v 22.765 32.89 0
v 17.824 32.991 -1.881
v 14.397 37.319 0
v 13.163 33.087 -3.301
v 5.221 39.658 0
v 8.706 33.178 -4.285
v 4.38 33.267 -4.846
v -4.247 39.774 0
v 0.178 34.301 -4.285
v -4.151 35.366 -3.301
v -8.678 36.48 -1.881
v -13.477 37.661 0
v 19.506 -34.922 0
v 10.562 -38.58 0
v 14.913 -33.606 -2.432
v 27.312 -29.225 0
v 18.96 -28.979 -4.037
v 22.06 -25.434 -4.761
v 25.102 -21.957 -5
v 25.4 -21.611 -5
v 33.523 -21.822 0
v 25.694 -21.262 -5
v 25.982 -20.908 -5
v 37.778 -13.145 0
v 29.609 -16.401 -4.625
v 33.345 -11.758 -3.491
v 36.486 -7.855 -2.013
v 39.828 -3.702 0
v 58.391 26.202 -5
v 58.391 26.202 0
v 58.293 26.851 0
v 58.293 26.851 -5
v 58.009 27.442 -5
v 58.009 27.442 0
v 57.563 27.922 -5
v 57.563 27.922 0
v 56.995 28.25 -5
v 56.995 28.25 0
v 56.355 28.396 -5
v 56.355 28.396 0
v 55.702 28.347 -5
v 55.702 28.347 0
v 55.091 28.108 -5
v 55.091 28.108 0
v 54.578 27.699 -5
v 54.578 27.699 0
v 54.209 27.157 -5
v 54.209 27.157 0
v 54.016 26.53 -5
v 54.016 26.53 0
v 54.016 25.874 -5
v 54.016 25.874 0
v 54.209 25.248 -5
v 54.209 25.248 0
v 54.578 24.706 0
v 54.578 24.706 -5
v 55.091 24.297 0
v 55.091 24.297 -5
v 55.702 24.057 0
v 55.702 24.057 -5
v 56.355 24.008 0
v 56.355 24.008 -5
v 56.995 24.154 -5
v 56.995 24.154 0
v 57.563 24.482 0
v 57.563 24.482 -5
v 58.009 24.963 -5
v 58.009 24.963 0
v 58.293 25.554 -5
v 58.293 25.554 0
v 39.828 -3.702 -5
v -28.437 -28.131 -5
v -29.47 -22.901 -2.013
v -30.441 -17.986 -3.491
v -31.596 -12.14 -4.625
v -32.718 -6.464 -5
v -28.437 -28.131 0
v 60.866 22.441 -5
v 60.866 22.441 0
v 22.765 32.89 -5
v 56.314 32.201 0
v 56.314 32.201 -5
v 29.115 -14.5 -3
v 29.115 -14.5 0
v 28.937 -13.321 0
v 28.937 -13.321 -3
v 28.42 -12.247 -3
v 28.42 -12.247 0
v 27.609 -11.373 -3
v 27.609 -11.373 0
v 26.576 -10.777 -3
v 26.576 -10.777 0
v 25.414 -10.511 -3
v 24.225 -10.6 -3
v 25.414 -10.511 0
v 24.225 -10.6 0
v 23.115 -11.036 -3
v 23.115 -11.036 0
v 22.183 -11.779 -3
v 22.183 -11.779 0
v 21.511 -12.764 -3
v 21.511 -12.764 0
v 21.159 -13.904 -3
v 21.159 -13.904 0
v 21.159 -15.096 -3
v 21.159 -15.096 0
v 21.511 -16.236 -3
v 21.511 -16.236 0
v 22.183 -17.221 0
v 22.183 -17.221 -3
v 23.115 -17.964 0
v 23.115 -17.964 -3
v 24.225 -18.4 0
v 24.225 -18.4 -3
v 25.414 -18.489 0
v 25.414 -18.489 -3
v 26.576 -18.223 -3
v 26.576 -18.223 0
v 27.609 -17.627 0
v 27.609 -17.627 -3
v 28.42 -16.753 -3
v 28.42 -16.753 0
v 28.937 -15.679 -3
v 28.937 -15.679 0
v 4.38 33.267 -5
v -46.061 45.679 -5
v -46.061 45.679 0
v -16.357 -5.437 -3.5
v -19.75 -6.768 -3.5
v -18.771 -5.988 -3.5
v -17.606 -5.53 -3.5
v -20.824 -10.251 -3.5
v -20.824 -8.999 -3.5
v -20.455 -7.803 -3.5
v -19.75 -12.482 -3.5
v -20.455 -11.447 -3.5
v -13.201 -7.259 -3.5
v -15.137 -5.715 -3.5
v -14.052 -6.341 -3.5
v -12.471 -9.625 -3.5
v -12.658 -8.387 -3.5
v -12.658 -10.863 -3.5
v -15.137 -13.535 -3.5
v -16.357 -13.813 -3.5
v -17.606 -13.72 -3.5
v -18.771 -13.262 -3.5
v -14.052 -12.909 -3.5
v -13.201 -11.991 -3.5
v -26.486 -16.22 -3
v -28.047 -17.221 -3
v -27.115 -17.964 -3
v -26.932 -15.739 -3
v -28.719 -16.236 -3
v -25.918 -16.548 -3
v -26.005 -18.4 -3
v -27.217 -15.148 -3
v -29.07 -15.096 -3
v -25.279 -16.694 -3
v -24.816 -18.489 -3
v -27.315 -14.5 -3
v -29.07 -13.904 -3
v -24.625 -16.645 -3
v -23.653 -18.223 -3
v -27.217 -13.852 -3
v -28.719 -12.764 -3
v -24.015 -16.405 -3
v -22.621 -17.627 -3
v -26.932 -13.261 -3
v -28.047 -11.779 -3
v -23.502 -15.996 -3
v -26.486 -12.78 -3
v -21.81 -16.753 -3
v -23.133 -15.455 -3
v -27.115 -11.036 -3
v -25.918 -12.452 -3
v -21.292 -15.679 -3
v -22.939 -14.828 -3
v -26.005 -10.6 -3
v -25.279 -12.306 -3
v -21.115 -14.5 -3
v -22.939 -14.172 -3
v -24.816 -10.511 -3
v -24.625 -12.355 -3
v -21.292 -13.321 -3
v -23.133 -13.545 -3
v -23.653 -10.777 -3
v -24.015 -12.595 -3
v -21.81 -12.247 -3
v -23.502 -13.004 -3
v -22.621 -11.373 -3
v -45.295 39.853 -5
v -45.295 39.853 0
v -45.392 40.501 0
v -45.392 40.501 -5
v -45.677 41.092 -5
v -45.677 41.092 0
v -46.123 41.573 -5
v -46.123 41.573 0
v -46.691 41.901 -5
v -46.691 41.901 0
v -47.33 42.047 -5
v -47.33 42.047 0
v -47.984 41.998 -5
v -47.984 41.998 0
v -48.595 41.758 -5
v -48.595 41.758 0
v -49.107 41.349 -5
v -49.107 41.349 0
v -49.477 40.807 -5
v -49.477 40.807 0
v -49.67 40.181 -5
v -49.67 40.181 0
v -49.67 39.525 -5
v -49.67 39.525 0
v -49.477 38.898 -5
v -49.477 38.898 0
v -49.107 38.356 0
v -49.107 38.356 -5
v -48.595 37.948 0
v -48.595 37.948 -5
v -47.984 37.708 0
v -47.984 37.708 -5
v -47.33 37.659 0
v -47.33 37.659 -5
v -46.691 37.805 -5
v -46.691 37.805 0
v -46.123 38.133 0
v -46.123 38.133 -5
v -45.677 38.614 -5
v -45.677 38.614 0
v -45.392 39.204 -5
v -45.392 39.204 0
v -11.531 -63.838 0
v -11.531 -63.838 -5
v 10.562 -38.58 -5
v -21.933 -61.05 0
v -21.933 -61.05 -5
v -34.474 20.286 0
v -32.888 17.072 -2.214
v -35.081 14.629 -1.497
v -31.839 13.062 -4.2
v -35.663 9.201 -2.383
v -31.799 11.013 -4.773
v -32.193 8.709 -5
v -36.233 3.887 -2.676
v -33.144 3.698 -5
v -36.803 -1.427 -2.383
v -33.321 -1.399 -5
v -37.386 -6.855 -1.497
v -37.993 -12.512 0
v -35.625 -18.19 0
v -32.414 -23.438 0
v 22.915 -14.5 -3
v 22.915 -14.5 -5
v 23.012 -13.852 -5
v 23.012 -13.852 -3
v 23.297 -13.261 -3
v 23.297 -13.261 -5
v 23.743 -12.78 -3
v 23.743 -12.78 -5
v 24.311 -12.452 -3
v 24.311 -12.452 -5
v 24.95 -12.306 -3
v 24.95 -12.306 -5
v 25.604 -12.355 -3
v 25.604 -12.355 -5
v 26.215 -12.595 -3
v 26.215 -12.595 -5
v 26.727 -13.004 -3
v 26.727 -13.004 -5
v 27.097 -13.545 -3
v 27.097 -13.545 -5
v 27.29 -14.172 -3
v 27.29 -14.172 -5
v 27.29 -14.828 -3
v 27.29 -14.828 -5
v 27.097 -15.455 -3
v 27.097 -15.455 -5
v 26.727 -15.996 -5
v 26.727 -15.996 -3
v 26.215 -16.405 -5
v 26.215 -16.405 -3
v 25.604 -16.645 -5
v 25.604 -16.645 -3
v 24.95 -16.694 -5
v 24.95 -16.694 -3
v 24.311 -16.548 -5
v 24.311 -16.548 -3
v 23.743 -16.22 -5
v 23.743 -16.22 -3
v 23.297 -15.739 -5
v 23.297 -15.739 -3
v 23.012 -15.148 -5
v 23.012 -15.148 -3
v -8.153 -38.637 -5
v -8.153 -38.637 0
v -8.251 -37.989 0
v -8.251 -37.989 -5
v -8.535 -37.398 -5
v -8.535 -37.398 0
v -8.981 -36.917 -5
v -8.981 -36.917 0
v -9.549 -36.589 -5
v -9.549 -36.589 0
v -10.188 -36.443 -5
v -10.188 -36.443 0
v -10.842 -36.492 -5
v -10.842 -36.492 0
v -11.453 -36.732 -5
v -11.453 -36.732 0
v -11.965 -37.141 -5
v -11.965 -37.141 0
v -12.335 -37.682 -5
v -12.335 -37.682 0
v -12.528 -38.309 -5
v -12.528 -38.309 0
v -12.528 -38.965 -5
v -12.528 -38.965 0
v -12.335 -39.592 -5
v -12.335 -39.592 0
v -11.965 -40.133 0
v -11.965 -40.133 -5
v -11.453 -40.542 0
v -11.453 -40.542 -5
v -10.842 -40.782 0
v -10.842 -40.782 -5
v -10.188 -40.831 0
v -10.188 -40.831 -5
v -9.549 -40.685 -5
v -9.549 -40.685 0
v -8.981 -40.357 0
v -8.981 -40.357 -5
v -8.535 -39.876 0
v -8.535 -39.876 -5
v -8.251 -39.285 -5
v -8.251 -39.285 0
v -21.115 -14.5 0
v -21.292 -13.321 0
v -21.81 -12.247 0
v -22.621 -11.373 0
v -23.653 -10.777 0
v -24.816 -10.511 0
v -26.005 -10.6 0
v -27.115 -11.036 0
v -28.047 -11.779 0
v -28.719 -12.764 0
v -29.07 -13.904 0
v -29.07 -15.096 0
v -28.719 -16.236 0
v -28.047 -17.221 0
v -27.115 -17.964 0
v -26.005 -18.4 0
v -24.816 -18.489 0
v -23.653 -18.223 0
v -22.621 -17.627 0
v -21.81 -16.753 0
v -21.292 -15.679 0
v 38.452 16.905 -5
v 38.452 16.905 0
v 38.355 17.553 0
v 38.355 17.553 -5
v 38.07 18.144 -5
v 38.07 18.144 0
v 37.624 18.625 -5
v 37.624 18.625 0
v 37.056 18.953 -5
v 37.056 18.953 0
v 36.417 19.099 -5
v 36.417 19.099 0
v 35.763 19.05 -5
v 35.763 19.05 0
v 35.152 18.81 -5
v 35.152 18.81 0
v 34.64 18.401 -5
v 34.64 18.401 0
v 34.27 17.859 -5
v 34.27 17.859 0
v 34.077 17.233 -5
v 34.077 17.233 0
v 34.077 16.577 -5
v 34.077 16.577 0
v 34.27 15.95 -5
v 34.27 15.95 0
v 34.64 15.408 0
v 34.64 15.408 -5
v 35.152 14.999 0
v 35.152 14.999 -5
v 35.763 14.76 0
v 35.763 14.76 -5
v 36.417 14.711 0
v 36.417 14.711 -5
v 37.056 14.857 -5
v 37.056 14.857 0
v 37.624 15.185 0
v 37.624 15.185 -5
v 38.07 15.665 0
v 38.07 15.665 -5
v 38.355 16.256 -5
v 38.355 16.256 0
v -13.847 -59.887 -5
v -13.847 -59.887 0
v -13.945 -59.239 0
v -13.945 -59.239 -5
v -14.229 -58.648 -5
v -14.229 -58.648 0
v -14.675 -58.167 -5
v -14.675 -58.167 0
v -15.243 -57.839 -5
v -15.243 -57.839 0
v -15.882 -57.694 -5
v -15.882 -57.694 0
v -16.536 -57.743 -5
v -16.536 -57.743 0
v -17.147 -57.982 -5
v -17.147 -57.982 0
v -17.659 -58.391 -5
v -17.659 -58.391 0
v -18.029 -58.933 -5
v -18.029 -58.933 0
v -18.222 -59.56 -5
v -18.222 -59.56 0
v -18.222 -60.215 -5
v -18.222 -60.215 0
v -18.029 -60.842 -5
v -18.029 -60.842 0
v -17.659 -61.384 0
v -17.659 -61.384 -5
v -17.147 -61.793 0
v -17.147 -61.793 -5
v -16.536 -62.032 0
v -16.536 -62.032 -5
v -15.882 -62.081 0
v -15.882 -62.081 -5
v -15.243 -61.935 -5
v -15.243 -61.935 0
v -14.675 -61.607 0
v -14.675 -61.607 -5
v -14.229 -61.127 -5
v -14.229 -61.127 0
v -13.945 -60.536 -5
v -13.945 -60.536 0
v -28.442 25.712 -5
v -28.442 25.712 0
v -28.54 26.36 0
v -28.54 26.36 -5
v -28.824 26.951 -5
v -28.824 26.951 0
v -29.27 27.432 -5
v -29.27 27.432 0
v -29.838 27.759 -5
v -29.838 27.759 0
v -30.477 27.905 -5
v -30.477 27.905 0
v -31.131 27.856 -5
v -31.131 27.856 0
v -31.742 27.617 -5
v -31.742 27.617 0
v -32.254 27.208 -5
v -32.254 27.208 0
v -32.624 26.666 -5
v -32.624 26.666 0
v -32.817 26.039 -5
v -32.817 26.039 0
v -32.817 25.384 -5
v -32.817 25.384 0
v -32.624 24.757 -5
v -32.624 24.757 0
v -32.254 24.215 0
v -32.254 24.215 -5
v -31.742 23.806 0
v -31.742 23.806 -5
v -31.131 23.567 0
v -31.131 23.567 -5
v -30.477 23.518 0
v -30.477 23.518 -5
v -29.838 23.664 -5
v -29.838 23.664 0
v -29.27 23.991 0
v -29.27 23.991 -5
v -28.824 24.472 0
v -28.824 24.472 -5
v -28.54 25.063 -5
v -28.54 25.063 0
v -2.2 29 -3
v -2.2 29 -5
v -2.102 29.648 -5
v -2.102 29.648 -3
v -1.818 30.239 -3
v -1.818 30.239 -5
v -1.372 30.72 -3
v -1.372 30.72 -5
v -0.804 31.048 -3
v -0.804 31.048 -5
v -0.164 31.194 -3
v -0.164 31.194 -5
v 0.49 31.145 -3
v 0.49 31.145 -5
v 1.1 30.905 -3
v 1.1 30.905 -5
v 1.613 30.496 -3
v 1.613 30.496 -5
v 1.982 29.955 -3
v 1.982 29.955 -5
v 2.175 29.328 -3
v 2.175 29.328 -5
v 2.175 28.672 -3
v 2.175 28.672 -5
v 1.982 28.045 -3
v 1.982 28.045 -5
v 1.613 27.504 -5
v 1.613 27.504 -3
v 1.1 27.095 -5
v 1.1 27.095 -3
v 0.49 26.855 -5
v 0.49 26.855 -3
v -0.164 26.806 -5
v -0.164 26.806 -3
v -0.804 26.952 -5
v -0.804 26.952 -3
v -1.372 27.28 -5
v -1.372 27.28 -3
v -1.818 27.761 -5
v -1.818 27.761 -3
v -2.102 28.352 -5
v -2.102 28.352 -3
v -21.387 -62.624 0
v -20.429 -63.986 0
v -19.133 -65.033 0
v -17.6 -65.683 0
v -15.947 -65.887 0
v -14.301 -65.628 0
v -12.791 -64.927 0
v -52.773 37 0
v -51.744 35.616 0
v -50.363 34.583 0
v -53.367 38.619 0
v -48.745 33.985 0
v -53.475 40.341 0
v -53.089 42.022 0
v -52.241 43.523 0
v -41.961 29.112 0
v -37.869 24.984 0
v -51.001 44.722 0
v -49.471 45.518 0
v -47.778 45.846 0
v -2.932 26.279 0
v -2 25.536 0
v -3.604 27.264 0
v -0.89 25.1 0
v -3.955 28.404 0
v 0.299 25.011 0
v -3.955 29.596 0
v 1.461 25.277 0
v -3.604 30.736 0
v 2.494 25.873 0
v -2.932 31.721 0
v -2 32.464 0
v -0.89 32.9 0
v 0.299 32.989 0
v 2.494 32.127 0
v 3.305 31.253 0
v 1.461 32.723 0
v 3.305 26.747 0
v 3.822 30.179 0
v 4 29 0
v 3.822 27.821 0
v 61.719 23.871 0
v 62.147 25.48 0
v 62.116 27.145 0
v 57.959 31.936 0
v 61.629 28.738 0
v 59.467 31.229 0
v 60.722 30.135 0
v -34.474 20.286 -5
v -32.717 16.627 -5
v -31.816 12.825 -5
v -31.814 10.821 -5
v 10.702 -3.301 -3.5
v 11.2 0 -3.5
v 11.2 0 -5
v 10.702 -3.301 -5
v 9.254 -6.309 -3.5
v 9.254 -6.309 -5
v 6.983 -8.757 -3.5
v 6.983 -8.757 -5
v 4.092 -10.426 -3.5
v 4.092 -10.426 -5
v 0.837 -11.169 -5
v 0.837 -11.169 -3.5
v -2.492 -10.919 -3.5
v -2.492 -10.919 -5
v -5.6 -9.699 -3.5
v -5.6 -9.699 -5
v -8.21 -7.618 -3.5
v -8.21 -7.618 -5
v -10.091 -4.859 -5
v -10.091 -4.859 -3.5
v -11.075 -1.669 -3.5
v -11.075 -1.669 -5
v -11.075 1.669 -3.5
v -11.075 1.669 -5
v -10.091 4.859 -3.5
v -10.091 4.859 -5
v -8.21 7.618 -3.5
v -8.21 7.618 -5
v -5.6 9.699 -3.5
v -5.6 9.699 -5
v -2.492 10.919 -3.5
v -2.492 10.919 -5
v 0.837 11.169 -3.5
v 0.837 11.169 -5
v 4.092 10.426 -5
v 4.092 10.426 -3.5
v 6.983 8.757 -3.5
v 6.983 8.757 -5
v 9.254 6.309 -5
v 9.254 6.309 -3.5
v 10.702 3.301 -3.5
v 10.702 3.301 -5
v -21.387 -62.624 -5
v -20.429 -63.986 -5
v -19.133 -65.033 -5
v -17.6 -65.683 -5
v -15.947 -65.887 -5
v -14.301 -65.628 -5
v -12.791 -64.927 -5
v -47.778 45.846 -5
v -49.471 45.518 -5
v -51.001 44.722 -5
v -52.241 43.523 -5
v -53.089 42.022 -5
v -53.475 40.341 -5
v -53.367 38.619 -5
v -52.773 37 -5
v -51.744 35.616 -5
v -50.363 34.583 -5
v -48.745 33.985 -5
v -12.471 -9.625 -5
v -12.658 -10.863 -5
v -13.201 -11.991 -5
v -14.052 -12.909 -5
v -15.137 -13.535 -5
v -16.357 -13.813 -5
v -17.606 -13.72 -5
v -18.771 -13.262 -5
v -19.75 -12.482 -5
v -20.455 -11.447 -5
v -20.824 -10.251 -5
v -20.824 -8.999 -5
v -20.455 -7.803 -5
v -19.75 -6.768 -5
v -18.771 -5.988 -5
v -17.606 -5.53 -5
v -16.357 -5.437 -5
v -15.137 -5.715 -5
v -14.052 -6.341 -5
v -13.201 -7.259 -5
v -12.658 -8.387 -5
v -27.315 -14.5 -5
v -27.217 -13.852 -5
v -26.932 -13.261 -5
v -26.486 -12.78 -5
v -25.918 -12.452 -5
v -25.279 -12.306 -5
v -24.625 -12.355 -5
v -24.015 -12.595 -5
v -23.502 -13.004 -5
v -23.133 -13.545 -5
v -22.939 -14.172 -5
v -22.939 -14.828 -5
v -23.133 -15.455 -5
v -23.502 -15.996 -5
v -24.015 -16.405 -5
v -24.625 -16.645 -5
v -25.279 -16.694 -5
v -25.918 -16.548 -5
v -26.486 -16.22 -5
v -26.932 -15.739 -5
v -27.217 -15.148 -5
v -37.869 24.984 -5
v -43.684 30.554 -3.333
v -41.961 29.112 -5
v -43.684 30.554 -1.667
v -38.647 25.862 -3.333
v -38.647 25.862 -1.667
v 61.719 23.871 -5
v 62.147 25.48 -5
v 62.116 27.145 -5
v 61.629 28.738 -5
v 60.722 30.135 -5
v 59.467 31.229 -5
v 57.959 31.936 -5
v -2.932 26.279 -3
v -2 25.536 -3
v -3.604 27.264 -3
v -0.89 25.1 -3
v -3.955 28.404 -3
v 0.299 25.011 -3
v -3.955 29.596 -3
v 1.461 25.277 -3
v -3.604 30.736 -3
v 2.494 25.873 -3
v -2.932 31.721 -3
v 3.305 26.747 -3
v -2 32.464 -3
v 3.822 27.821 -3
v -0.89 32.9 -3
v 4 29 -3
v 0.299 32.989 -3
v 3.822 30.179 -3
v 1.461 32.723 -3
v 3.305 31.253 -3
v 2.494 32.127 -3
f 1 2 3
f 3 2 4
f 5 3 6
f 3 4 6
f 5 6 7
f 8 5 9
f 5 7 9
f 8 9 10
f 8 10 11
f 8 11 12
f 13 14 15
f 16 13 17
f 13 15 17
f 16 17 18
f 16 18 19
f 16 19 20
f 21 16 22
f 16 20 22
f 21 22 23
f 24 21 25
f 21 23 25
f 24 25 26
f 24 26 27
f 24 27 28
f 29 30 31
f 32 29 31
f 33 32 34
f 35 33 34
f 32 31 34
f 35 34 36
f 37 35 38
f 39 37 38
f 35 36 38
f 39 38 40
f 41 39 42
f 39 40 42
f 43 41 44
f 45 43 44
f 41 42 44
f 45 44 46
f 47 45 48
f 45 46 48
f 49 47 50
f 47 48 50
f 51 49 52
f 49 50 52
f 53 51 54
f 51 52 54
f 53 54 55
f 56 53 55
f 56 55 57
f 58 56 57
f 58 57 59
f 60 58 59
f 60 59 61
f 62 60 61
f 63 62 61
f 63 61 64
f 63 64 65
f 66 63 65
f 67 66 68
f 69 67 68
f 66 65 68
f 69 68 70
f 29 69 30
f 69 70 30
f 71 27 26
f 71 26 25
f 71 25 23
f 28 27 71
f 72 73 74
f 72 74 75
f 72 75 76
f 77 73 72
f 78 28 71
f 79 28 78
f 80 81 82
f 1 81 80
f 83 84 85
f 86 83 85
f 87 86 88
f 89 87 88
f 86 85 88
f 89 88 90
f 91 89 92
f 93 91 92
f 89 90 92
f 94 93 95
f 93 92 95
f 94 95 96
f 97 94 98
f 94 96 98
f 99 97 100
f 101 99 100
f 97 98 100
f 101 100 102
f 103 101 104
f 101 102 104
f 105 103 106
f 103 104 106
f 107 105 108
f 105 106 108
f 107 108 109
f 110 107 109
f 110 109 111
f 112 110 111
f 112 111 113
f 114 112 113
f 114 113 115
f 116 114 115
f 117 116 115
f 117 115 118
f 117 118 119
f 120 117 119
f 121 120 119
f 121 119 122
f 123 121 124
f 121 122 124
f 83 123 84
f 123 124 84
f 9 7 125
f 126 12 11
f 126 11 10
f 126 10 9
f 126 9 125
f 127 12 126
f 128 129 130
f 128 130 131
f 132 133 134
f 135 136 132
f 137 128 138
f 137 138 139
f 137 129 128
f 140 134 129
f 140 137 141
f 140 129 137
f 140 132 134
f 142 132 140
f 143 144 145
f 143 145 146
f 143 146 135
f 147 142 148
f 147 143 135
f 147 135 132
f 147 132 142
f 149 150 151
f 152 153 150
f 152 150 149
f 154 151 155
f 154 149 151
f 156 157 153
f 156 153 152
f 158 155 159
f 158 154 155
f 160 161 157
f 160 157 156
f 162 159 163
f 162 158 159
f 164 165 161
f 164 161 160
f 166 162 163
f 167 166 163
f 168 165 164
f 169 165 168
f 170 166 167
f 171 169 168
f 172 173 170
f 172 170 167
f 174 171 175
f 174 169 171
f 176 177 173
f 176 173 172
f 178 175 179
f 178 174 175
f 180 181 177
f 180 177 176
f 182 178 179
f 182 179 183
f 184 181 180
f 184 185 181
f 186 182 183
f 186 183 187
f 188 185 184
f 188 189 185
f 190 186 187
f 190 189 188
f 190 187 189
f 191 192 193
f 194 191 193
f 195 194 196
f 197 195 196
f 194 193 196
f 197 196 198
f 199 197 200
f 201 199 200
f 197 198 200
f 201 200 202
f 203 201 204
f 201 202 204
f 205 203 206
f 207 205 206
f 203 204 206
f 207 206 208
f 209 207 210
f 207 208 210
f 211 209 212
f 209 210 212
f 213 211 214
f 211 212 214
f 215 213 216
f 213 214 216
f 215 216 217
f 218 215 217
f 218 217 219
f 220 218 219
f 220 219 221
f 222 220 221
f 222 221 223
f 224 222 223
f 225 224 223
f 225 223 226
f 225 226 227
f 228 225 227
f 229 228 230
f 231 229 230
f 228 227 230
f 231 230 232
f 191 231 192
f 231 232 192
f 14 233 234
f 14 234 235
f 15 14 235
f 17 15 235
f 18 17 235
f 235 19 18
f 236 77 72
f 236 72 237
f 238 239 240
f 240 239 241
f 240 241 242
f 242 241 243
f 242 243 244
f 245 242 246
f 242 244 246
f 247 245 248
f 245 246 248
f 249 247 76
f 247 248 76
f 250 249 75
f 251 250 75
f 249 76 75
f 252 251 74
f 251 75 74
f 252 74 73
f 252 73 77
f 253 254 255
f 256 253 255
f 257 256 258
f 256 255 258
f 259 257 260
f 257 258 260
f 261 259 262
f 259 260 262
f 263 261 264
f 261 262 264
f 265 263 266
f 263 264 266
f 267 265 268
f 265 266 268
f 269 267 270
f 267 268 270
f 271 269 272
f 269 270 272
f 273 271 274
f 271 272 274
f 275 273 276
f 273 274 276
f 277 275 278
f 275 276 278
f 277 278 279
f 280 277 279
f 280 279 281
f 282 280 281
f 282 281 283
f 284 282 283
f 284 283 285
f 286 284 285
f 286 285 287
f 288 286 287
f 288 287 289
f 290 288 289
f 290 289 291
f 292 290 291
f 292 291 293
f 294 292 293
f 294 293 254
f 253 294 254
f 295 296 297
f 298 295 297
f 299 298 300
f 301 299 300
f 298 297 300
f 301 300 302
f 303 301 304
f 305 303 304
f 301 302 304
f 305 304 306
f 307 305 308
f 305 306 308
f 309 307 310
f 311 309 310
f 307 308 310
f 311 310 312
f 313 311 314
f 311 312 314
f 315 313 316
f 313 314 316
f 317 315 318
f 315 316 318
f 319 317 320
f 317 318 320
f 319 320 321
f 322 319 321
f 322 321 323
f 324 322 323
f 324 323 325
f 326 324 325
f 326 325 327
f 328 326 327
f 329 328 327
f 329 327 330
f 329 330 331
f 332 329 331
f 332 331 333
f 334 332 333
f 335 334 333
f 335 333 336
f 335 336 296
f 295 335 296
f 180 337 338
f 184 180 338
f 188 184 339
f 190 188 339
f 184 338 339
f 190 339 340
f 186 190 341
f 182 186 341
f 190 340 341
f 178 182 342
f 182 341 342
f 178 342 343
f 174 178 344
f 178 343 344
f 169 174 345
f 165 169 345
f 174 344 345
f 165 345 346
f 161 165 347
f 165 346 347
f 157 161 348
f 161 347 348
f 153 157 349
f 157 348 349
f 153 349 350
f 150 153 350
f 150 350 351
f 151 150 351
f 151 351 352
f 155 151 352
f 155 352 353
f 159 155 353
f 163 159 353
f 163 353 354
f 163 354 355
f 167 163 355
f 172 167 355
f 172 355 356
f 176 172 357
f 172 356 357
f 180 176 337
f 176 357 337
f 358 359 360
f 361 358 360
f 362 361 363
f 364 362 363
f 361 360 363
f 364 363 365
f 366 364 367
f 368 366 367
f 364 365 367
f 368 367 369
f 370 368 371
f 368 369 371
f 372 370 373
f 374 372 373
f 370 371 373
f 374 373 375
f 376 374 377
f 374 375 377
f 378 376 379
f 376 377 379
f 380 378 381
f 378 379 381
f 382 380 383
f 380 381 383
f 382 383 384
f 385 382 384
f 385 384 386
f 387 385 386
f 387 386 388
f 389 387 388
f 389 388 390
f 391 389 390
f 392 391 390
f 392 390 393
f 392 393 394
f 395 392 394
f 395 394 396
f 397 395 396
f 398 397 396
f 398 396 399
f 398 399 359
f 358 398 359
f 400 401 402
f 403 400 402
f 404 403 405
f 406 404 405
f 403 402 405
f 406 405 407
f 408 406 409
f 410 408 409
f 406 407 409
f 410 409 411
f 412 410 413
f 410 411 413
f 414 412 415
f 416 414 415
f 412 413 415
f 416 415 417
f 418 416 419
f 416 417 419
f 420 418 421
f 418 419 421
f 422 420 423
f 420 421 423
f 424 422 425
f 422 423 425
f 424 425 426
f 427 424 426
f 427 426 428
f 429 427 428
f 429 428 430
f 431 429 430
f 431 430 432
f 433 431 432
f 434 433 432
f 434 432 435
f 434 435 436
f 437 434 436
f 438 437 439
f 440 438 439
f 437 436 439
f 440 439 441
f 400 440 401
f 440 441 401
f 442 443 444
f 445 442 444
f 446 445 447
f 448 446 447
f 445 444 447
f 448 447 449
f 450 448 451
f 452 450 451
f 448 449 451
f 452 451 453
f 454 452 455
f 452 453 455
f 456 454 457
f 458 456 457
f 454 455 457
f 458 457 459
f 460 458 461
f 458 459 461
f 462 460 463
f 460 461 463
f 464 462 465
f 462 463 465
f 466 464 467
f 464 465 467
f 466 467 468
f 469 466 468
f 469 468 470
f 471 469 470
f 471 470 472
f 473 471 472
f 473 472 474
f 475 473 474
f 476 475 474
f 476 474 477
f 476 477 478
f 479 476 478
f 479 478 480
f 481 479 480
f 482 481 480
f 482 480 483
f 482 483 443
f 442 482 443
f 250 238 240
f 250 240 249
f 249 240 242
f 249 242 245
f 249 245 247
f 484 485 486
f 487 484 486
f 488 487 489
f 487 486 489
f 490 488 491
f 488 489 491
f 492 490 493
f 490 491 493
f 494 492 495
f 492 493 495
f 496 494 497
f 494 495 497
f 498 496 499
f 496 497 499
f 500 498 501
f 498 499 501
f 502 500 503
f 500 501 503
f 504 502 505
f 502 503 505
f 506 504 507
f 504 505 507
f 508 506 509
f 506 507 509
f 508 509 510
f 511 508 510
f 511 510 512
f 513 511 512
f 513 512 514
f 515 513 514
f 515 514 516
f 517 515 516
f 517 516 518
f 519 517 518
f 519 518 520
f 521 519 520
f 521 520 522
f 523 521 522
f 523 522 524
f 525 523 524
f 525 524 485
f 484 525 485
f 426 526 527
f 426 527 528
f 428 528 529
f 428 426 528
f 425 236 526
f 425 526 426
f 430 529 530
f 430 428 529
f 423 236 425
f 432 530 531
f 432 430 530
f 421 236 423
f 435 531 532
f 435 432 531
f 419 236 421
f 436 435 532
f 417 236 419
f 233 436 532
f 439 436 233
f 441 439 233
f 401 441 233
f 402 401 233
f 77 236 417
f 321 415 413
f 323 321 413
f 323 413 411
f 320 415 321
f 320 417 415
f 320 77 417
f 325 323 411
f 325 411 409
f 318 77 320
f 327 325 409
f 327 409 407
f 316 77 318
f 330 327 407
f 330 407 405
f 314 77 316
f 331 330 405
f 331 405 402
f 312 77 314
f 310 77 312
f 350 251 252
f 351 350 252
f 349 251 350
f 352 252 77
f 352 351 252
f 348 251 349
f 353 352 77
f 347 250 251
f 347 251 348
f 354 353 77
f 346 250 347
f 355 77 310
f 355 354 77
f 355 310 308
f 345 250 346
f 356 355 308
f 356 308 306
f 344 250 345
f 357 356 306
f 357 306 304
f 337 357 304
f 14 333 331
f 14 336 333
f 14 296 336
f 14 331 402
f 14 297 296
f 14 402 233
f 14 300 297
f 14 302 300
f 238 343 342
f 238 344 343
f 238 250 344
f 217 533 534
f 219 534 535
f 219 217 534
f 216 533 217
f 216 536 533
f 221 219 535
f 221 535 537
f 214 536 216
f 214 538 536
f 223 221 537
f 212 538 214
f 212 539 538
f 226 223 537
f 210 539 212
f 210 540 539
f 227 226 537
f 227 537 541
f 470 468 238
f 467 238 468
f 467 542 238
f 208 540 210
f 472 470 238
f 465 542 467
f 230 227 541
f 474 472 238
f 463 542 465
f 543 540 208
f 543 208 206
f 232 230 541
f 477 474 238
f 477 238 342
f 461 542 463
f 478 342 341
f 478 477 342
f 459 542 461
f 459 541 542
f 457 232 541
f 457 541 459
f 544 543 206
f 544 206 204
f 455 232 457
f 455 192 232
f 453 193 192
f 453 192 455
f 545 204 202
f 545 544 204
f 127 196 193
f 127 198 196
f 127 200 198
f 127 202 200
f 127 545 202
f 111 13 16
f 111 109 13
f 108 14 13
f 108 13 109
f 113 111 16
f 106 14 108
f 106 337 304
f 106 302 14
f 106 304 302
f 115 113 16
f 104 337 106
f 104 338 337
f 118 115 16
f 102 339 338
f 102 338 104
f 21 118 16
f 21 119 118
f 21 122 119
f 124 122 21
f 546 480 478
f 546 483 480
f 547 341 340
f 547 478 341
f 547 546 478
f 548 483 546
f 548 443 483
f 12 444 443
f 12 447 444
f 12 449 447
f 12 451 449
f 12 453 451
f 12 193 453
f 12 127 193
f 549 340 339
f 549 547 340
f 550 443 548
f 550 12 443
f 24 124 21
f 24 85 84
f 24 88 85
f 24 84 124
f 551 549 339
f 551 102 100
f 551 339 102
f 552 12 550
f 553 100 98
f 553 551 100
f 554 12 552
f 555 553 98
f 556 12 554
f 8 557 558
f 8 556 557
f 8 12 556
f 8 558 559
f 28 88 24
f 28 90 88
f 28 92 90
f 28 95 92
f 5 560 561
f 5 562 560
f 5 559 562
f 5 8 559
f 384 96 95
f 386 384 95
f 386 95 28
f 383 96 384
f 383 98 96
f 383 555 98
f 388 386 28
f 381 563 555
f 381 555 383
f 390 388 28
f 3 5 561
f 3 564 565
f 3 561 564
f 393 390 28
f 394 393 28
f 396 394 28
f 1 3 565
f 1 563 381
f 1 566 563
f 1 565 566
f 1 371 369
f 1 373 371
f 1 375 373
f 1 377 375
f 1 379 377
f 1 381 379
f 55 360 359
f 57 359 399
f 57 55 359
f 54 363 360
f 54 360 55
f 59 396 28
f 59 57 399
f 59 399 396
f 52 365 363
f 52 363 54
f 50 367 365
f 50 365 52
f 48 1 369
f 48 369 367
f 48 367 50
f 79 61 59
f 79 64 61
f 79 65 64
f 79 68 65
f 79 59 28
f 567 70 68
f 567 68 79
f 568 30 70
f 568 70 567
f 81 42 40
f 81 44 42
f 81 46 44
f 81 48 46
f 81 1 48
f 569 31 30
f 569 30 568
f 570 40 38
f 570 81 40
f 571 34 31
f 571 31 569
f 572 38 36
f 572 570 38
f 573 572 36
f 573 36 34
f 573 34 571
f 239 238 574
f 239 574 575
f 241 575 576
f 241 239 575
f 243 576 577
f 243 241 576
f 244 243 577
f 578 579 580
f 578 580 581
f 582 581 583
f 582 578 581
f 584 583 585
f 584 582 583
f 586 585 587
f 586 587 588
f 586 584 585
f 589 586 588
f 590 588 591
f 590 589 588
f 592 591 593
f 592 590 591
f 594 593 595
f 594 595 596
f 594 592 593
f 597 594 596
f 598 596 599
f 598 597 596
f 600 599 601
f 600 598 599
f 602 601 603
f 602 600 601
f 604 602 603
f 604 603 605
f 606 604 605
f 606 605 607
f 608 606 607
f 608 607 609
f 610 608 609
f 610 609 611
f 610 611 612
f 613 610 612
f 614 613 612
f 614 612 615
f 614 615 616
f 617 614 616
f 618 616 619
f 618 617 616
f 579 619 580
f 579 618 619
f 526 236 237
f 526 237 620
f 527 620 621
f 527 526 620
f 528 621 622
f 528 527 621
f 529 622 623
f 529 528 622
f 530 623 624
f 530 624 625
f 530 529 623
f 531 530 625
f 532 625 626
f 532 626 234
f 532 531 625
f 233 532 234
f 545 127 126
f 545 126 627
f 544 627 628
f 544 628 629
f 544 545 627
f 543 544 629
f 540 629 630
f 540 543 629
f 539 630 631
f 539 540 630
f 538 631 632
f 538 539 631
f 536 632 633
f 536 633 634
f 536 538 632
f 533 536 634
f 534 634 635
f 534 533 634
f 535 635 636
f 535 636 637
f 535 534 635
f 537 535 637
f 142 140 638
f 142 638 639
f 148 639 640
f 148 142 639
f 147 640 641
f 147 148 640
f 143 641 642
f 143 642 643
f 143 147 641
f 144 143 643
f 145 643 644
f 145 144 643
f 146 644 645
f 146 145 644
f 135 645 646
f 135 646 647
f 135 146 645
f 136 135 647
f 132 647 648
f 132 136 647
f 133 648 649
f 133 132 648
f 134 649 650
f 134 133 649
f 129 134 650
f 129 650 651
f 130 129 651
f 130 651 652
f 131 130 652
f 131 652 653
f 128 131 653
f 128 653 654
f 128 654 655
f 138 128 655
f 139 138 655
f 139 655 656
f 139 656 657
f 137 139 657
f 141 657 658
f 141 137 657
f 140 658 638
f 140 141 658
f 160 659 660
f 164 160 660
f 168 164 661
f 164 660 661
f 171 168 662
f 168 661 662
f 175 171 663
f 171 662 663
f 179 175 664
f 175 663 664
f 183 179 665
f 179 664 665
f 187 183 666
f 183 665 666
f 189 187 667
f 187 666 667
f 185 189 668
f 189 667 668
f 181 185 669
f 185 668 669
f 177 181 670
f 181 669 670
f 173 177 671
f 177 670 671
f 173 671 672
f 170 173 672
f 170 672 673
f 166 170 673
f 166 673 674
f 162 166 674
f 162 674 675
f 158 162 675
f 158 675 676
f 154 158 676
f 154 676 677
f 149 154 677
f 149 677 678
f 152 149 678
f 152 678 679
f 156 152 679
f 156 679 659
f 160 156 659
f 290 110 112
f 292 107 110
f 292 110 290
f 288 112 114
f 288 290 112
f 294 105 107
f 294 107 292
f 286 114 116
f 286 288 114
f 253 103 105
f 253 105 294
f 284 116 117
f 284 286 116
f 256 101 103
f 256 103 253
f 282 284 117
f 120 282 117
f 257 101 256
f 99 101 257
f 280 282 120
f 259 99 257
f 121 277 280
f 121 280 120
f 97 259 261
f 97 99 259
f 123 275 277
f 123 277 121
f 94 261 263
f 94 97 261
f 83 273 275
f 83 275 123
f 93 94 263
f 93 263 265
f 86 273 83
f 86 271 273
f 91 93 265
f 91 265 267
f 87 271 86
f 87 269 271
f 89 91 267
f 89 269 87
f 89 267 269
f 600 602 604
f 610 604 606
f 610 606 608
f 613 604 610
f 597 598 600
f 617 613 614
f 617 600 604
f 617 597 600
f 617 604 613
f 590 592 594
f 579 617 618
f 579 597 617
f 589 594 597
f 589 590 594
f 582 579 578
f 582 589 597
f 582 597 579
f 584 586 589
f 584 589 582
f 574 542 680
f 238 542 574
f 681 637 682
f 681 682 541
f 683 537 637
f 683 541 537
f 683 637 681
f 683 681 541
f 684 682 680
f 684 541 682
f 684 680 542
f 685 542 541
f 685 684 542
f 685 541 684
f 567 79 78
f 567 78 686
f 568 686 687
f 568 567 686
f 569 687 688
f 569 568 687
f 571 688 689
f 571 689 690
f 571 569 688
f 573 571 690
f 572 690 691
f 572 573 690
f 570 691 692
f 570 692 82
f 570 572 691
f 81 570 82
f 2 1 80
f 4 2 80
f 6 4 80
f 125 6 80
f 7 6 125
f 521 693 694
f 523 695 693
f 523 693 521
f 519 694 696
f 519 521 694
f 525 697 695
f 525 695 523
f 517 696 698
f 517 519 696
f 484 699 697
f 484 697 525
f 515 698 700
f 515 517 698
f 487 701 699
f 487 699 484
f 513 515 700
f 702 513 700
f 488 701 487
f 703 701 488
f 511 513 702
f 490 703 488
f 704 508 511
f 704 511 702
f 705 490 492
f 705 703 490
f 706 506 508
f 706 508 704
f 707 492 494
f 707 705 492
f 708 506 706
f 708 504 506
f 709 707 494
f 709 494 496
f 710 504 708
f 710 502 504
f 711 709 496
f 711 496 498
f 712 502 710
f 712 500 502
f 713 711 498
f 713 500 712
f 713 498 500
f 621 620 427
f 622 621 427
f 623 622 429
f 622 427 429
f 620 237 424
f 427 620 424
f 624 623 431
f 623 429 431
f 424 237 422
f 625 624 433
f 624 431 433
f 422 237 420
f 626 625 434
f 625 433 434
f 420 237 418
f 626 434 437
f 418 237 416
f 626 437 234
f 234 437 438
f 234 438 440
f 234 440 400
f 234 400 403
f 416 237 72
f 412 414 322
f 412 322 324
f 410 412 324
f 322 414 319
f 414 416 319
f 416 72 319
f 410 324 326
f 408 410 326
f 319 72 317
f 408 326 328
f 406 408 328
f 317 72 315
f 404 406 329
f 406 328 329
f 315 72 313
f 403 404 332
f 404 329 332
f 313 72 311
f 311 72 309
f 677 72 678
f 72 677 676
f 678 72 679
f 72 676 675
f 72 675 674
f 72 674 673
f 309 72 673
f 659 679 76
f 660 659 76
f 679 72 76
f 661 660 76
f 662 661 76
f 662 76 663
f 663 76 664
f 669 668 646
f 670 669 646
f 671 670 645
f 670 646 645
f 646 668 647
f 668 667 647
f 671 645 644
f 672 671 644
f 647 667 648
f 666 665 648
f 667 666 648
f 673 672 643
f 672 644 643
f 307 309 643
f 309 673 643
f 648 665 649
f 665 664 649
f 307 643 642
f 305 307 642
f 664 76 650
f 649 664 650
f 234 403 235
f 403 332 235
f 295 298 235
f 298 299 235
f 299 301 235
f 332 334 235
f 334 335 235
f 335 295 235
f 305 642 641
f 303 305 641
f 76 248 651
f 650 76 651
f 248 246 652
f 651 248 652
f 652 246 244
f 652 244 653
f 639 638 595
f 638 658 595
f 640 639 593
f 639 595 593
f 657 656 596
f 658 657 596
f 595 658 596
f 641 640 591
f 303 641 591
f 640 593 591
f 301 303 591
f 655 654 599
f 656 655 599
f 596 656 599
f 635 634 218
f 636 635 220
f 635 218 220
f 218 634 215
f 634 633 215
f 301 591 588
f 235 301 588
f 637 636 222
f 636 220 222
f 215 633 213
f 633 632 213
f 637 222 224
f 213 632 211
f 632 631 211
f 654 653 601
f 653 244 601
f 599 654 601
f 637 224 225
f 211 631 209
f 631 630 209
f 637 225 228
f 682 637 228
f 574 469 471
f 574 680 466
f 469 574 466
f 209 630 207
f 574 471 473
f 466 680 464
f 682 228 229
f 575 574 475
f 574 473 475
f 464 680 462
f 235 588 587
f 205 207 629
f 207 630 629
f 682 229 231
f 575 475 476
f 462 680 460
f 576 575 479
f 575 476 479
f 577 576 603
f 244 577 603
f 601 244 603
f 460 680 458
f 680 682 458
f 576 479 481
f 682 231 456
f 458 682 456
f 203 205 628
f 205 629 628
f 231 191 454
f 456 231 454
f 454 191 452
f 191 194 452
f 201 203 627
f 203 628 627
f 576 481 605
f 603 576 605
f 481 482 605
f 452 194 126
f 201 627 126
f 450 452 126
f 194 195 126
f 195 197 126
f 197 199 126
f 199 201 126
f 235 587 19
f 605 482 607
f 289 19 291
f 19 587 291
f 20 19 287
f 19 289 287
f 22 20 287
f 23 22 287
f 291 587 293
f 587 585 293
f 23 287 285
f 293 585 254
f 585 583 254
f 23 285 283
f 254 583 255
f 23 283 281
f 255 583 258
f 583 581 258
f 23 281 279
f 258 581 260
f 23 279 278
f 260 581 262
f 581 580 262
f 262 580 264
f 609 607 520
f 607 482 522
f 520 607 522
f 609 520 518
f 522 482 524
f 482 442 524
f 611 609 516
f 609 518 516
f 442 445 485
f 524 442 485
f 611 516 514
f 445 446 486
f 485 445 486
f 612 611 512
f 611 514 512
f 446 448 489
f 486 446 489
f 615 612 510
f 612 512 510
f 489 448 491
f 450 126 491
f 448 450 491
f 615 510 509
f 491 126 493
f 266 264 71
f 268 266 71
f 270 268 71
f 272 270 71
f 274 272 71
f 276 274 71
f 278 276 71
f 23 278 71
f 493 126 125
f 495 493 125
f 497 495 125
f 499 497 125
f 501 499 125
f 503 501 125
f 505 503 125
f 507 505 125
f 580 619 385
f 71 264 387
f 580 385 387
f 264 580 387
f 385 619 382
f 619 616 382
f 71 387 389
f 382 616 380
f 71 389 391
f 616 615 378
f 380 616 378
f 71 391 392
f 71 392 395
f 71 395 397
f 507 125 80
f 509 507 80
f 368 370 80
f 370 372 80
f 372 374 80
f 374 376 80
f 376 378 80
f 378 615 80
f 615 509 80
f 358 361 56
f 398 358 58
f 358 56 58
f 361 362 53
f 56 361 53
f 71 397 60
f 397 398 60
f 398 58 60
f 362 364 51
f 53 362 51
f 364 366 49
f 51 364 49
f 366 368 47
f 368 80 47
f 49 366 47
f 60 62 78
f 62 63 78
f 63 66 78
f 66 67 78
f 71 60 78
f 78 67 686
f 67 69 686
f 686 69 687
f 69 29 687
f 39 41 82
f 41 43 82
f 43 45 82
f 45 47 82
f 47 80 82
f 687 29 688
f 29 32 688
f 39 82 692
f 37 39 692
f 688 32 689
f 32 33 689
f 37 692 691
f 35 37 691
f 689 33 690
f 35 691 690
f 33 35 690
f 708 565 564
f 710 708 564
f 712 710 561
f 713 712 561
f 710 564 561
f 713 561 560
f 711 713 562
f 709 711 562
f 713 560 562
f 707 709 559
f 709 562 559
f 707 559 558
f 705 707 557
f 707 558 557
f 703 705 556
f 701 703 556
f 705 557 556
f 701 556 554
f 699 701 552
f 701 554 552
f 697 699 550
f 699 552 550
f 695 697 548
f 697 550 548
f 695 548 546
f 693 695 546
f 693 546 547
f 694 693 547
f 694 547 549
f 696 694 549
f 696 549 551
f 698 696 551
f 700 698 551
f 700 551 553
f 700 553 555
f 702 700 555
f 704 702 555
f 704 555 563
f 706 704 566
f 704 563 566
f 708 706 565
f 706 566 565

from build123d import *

# Parameters (mm, degrees)
SKETCH_1_R               = 40
SKETCH_2_R               = 33.35
SKETCH_3_R               = 2.2
CUT_EXTRUDE_1_DEPTH      = 57.789083608
SKETCH_4_R               = 4
CUT_EXTRUDE_2_DEPTH      = 3
OTHER_START              = -5
OTHER_1_OUTLINE_R        = 4
OTHER_1_OUTLINE_R_2      = 2.9
OTHER_1_OUTLINE_R_3      = 11
OTHER_1_OUTLINE_R_4      = 9
OTHER_1_DEPTH            = 1.5
CUT_EXTRUDE_START        = 27
SKETCH_5_R               = 11.2
SKETCH_5_R_2             = 4.2
CUT_EXTRUDE_3_DEPTH      = 1.5
SKETCH_7_R               = 2.2
EXTRUDE_1_DEPTH          = 5
HOLE_WIZARD_4_4_4_4_1_D  = 4.4
CUT_EXTRUDE_4_DEPTH      = 91.740732016
CUT_EXTRUDE_4_DEPTH_BACK = 91.740732016


# Read off the part's stored shape, not the designer's step: 型腔1
with BuildPart() as part:
    # 草图1 → 放样2 section 0
    with BuildSketch(Plane.XY):
        Circle(SKETCH_1_R)
    # 草图2 → 放样2 section 1
    with BuildSketch(Plane.XY.offset(-5)):
        Circle(SKETCH_2_R)
    loft()

    # 草图3 → 切除-拉伸1 (cut, through all)
    with BuildSketch(Plane(origin=(0, 0, -5), x_dir=(-1, 0, 0), z_dir=(0, 0, -1))):
        with Locations((-25.11473671, -14.5)):
            Circle(SKETCH_3_R)
        with Locations((25.11473671, -14.5)):
            Circle(SKETCH_3_R)
        with Locations((0, 29)):
            Circle(SKETCH_3_R)
    extrude(amount=-CUT_EXTRUDE_1_DEPTH, mode=Mode.SUBTRACT)

    # 草图4 → 切除-拉伸2 (cut)
    with BuildSketch(Plane.XY):
        with Locations((0, 29)):
            Circle(SKETCH_4_R)
        with Locations((25.11473671, -14.5)):
            Circle(SKETCH_4_R)
        with Locations((-25.11473671, -14.5)):
            Circle(SKETCH_4_R)
    extrude(amount=-CUT_EXTRUDE_2_DEPTH, mode=Mode.SUBTRACT)

    # 型腔1 outline → 型腔1 (cut)
    # profile 1 of 2: a face of its own
    with BuildSketch(Plane.XY.offset(OTHER_START)):
        with Locations((-16.670989023, -9.625)):
            Circle(OTHER_1_OUTLINE_R)
        with Locations((-16.670989023, -9.625)):
            Circle(OTHER_1_OUTLINE_R_2, mode=Mode.SUBTRACT)
    # profile 2 of 2: a face of its own
    with BuildSketch(Plane.XY.offset(OTHER_START)):
        Circle(OTHER_1_OUTLINE_R_3)
        Circle(OTHER_1_OUTLINE_R_4, mode=Mode.SUBTRACT)
    extrude(amount=OTHER_1_DEPTH, mode=Mode.SUBTRACT)

    # 草图5 → 切除-拉伸3 (cut)
    with BuildSketch(Plane(origin=(52.090644265, -18.098750786, 23.5), x_dir=(0.9659258262890773, -0.2588190451024873, 0), z_dir=(0, 0, -1)).offset(CUT_EXTRUDE_START)):
        with Locations(Location((-55, -4, 0), (0, 0, 345))):
            Circle(SKETCH_5_R)
        with Locations(Location((-68.611805538, 9.611805538, 0), (0, 0, 345))):
            Circle(SKETCH_5_R_2)
    extrude(amount=CUT_EXTRUDE_3_DEPTH, mode=Mode.SUBTRACT)

    # 草图7 → 凸台-拉伸1 (add)
    # profile 1 of 5: a face of its own
    with BuildSketch(Plane.XY):
        with BuildLine():
            Line((56.314218304, 32.201068565), (22.765462134, 32.889720793))
            ThreePointArc((22.765462134, 32.889720793), (35.43034353, 18.565849222), (40, 0))
            ThreePointArc((40, 0), (39.957063165, -1.852863527), (39.828344838, -3.701749249))
            Line((39.828344838, -3.701749249), (60.865531412, 22.440746108))
            ThreePointArc((60.865531412, 22.440746108), (61.628929518, 28.738041798), (56.314218304, 32.201068565))
        make_face()
        with Locations((56.191082796, 26.202332228)):
            Circle(SKETCH_7_R, mode=Mode.SUBTRACT)
    # profile 2 of 5: a face of its own
    with BuildSketch(Plane.XY):
        with BuildLine():
            Line((-13.477261693, 37.661165904), (-46.06110803, 45.679035969))
            ThreePointArc((-46.06110803, 45.679035969), (-53.34269802, 41.195056807), (-48.745228802, 33.984585346))
            add(Edge.make_bspline(
                [(-48.745228802, 33.984585346), (-43.952768946, 31.311585993), (-37.935277565, 26.17758836), (-34.474104128, 20.286353653)],
                knots=[0, 0, 0, 0, 0.622020345, 0.622020345, 0.622020345, 0.622020345], degree=3))
            ThreePointArc((-34.474104128, 20.286353653), (-25.50106657, 30.81713166), (-13.477261693, 37.661165904))
        make_face()
        with Locations((-47.494755473, 39.852831801)):
            Circle(SKETCH_7_R, mode=Mode.SUBTRACT)
    # profile 3 of 5: a face of its own
    with BuildSketch(Plane.XY):
        with BuildLine():
            Line((4.379699915, 33.26712364), (-13.477261693, 37.661165904))
            ThreePointArc((-13.477261693, 37.661165904), (-25.50106657, 30.81713166), (-34.474104128, 20.286353653))
            add(Edge.make_bspline(
                [(-34.474104128, 20.286353653), (-33.715659981, 18.995412138), (-31.952819591, 15.314686764), (-31.439882273, 11.492206468), (-32.192854649, 8.708766247)],
                knots=[0.622020345, 0.622020345, 0.622020345, 0.622020345, 0.758323162, 1, 1, 1, 1], degree=3))
            ThreePointArc((-32.192854649, 8.708766247), (4.392652812, 33.059447988), (33.35, 0))
            ThreePointArc((33.35, 0), (31.454149072, -11.084178191), (25.982143558, -20.908149515))
            Line((25.982143558, -20.908149515), (39.828344838, -3.701749249))
            ThreePointArc((39.828344838, -3.701749249), (39.957063165, -1.852863527), (40, 0))
            ThreePointArc((40, 0), (35.43034353, 18.565849222), (22.765462134, 32.889720793))
            Line((22.765462134, 32.889720793), (4.379699915, 33.26712364))
        make_face()
    # profile 4 of 5: a face of its own
    with BuildSketch(Plane.XY):
        with BuildLine():
            ThreePointArc((10.561630861, -38.580460774), (-10.352761804, -38.637033052), (-28.436871018, -28.13084369))
            Line((-28.436871018, -28.13084369), (-21.933000593, -61.050335666))
            ThreePointArc((-21.933000593, -61.050335666), (-17.599695067, -65.682956188), (-11.530632138, -63.837641893))
            Line((-11.530632138, -63.837641893), (10.561630861, -38.580460774))
        make_face()
        with Locations((-16.046780796, -59.88740123)):
            Circle(SKETCH_7_R, mode=Mode.SUBTRACT)
    # profile 5 of 5: a face of its own
    with BuildSketch(Plane.XY):
        with BuildLine():
            Line((-32.717571704, -6.463977243), (-28.436871018, -28.13084369))
            ThreePointArc((-28.436871018, -28.13084369), (-10.352761804, -38.637033052), (10.561630861, -38.580460774))
            Line((10.561630861, -38.580460774), (25.102259624, -21.956754354))
            ThreePointArc((25.102259624, -21.956754354), (-8.631615154, -32.213626307), (-32.717571704, -6.463977243))
        make_face()
    extrude(amount=-EXTRUDE_1_DEPTH)

    # Ø4.4 (4.4) 直径孔1 (through all)
    with Locations(Plane(origin=(0, 0, -5), x_dir=(-1, 0, 0), z_dir=(0, 0, -1))):
        with Locations((10.352761804, -38.637033052), (-36.252311481, 16.90473047), (30.641777725, 25.711504387)):
            Hole(HOLE_WIZARD_4_4_4_4_1_D / 2)

    # 草图10 → 切除-拉伸4 (cut, two sides: drawn at the far end of the back side and taken through both)
    with BuildSketch(Plane(origin=(0, 0, -5), x_dir=(-1, 0, 0), z_dir=(0, 0, -1)).offset(-CUT_EXTRUDE_4_DEPTH_BACK)):
        Polygon((34.47410458, 20.28635588), (38.372841801, -16.056659606), (62.683016438, 23.101645648), align=None)
    extrude(amount=CUT_EXTRUDE_4_DEPTH + CUT_EXTRUDE_4_DEPTH_BACK, mode=Mode.SUBTRACT)


solid = part.part
